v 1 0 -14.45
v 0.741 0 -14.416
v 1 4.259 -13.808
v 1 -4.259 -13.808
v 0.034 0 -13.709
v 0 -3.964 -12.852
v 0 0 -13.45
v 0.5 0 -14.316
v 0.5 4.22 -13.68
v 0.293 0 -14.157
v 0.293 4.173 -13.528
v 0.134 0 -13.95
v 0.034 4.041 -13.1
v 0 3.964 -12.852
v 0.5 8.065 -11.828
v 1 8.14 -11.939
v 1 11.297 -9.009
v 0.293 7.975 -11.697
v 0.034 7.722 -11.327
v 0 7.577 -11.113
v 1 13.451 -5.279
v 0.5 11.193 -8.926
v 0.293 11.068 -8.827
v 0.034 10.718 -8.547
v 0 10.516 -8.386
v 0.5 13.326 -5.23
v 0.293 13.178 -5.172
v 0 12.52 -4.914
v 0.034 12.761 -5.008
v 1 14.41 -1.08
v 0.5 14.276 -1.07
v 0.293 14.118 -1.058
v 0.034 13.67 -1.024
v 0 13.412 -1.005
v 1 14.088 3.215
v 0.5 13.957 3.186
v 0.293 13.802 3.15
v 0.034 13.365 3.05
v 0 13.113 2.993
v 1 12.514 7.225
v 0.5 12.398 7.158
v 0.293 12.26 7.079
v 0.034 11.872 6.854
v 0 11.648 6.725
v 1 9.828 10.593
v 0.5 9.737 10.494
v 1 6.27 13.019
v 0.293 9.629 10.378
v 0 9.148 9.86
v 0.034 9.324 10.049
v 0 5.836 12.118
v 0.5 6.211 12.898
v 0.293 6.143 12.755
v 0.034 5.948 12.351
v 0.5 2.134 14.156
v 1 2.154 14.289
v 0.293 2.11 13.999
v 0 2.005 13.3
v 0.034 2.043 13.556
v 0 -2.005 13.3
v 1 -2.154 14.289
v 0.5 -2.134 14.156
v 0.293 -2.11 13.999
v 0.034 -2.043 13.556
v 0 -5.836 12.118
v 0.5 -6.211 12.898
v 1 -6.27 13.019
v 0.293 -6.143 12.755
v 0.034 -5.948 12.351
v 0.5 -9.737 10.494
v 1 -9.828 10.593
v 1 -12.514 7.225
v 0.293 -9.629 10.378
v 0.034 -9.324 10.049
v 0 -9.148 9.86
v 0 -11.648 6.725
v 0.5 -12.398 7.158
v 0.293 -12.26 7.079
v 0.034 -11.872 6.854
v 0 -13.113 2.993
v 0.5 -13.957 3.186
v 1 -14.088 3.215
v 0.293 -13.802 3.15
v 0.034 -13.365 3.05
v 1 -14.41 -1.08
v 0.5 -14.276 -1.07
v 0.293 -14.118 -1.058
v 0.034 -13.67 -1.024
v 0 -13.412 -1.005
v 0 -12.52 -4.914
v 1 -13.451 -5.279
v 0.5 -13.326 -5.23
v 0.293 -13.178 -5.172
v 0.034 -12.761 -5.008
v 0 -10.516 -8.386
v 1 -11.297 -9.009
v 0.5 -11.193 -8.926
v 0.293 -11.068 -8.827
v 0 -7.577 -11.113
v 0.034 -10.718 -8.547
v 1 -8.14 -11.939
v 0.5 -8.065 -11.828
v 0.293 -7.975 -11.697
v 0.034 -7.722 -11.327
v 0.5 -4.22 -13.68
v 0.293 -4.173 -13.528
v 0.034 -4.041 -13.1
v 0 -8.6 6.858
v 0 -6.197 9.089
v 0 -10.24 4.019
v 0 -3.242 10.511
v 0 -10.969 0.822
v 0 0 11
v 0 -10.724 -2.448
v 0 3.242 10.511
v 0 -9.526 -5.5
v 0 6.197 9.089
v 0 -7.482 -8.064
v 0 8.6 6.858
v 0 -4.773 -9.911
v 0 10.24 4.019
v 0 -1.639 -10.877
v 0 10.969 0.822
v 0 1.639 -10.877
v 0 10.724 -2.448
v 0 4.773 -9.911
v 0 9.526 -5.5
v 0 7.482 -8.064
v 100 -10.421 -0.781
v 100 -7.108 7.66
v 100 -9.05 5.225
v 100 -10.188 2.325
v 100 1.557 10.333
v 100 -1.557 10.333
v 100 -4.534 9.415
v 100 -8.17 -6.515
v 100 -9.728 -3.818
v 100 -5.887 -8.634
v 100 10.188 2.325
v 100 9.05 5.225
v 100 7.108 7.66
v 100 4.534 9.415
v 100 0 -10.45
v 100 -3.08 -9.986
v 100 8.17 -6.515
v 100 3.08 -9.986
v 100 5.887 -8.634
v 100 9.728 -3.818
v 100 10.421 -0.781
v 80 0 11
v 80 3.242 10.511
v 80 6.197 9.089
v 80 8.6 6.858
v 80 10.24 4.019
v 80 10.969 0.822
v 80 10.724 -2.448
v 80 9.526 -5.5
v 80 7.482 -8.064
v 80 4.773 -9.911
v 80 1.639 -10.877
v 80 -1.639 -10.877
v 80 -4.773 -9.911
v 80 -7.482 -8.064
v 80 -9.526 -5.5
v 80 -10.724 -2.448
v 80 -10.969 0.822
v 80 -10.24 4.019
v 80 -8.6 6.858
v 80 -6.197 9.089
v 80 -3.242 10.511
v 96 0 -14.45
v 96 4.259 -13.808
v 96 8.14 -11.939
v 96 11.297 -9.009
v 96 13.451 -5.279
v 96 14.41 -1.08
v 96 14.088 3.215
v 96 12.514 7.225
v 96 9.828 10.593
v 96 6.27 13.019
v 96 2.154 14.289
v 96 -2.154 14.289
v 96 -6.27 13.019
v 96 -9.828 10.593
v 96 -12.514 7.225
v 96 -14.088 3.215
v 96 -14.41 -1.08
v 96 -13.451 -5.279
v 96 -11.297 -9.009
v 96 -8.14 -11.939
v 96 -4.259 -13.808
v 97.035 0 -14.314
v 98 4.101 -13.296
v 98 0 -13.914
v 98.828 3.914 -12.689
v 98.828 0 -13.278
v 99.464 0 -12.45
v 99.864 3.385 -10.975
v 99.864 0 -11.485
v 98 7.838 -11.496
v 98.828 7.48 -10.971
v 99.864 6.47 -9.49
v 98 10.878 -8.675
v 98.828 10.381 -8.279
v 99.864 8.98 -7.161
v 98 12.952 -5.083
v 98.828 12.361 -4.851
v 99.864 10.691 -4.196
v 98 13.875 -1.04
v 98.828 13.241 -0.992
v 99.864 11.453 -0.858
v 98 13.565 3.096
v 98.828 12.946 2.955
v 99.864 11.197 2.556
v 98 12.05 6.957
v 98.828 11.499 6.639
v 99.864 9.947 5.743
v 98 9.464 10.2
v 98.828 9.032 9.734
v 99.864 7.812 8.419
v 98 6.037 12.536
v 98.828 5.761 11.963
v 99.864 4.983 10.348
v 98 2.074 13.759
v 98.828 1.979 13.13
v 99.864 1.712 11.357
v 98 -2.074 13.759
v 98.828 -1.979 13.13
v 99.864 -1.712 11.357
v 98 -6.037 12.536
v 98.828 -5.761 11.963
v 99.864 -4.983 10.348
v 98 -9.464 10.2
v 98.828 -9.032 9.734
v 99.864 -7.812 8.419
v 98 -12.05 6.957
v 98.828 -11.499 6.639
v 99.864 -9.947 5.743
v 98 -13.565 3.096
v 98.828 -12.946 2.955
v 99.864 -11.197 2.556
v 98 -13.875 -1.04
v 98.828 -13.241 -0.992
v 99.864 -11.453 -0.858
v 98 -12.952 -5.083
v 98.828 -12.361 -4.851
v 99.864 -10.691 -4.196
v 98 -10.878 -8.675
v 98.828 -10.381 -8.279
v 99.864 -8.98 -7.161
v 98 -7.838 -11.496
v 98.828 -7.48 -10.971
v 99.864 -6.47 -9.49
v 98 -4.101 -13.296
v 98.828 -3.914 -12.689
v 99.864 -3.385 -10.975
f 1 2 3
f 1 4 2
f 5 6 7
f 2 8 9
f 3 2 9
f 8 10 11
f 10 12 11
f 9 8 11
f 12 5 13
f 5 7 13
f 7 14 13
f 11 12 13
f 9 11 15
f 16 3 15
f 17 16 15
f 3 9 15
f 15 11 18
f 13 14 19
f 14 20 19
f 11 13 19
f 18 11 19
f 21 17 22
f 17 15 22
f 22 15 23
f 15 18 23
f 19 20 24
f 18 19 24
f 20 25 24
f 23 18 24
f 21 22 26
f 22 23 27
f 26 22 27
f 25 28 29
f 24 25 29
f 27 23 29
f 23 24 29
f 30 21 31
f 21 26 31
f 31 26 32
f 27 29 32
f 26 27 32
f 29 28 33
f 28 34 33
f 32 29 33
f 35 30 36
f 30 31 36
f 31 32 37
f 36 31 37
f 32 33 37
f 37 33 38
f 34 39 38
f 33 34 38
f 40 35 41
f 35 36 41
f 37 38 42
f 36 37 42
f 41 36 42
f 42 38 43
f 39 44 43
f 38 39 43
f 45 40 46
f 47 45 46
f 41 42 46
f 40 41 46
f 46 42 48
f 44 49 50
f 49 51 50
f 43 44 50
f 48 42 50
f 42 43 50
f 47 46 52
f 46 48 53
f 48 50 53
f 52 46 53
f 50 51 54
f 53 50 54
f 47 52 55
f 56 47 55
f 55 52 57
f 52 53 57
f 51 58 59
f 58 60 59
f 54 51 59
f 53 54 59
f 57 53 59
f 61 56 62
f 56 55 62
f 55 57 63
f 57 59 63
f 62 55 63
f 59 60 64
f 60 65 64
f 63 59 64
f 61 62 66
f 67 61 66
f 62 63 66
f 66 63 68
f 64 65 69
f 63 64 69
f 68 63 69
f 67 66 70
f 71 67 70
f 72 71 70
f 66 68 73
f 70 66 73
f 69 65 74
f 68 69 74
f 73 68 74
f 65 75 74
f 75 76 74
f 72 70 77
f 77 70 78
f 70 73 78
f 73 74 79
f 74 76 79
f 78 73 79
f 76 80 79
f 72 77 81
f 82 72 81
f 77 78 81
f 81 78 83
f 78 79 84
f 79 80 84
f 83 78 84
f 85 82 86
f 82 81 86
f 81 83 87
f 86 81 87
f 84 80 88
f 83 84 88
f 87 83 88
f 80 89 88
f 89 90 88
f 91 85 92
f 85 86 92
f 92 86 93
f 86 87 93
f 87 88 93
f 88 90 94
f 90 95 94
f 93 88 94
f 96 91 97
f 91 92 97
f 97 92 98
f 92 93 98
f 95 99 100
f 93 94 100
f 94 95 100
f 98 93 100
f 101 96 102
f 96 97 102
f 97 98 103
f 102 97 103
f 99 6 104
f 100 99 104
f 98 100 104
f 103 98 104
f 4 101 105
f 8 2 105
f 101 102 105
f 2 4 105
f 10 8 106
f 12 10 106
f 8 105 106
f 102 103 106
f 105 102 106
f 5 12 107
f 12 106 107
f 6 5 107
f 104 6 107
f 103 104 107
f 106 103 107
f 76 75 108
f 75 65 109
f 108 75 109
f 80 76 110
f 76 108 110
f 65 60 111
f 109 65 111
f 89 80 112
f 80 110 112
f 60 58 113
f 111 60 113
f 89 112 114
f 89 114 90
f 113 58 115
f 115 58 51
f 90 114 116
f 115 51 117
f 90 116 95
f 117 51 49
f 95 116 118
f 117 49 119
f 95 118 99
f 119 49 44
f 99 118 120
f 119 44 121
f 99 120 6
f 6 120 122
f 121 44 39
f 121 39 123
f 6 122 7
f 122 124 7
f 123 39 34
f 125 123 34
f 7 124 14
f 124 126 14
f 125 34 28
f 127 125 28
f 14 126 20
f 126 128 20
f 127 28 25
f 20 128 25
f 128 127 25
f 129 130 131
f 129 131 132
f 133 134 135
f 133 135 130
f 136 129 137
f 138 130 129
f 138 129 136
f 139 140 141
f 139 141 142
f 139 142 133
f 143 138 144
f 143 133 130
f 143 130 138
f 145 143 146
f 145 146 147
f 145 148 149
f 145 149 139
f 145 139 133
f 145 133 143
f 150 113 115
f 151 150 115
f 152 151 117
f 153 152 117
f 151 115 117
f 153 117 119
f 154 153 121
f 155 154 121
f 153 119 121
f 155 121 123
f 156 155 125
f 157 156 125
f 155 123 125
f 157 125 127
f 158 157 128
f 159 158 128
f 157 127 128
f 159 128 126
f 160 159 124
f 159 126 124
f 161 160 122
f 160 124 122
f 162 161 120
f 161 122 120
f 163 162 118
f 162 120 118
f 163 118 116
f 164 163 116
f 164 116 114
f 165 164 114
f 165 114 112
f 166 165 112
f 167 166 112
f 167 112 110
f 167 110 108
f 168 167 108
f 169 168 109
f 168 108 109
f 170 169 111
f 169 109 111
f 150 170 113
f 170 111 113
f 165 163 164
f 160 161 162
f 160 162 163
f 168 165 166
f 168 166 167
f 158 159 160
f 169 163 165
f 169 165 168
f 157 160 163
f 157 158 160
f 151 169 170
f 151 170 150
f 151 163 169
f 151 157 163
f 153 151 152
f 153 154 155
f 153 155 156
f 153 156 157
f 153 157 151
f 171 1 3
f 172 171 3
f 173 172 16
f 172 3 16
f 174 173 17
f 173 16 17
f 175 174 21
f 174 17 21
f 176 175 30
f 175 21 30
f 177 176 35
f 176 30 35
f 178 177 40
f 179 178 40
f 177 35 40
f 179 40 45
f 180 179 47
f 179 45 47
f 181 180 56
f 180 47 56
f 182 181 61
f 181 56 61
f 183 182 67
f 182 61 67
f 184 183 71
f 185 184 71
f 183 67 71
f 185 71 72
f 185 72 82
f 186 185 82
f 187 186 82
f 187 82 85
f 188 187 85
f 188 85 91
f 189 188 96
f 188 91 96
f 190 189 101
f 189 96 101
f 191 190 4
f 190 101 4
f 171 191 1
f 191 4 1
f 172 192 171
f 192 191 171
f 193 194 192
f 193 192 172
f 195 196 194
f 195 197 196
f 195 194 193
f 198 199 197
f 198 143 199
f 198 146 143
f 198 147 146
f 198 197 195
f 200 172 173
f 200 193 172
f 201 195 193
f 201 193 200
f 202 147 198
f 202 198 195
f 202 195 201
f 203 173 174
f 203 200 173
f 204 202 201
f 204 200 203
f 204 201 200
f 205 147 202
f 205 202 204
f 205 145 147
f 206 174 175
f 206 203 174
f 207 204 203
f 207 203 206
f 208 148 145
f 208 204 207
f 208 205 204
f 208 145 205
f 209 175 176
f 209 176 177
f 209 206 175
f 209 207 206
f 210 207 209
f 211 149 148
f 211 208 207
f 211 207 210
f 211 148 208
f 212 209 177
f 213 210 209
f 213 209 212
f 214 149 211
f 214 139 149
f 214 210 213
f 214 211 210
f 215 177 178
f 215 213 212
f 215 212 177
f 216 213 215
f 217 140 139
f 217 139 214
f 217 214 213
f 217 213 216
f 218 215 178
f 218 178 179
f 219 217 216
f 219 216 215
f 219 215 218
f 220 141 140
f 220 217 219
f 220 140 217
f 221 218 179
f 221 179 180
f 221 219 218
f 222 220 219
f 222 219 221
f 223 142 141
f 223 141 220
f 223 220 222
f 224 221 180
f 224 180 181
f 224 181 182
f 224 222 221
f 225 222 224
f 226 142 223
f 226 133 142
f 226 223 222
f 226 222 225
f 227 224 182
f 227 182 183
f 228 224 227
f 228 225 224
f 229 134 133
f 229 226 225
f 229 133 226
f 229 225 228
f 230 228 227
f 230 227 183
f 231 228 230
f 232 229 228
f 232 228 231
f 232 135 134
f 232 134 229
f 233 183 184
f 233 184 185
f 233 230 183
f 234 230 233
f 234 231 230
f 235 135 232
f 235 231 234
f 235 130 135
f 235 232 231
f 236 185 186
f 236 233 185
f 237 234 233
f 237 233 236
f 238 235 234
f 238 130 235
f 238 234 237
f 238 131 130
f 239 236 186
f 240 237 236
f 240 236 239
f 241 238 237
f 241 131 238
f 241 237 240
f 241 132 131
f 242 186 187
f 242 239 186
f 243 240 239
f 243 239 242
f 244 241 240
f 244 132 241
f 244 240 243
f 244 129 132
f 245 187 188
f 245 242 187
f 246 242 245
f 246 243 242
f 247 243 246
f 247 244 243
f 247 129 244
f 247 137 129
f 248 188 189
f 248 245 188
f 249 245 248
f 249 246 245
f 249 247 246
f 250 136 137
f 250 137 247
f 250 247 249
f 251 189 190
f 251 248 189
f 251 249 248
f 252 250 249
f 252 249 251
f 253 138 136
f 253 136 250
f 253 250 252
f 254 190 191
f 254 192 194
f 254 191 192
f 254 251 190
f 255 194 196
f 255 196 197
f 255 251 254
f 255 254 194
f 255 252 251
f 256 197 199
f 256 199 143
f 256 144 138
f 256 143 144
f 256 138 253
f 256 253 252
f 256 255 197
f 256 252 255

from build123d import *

# Parameters (mm, degrees)
SKETCH1_R           = 14.45
BOSS_EXTRUDE1_DEPTH = 100
FILLET1_R           = 4
SKETCH3_R           = 11
CUT_EXTRUDE1_DEPTH  = 80
FILLET2_R           = 1


with BuildPart() as part:
    # Sketch1 → Boss-Extrude1 (new body)
    with BuildSketch(Plane(origin=(0, 0, 0), x_dir=(0, 0, -1), z_dir=(1, 0, 0))):
        Circle(SKETCH1_R)
    extrude(amount=BOSS_EXTRUDE1_DEPTH)

    # Fillet1
    fillet1_edges = [part.edges().sort_by_distance(p)[0] for p in [
        (100, 0, 14.45),
    ]]
    fillet(fillet1_edges, radius=FILLET1_R)

    # Sketch3 → Cut-Extrude1 (cut)
    with BuildSketch(Plane.ZY):
        Circle(SKETCH3_R)
    extrude(amount=-CUT_EXTRUDE1_DEPTH, mode=Mode.SUBTRACT)

    # Fillet2
    fillet2_edges = [part.edges().sort_by_distance(p)[0] for p in [
        (0, 0, 14.45),
    ]]
    fillet(fillet2_edges, radius=FILLET2_R)


solid = part.part
